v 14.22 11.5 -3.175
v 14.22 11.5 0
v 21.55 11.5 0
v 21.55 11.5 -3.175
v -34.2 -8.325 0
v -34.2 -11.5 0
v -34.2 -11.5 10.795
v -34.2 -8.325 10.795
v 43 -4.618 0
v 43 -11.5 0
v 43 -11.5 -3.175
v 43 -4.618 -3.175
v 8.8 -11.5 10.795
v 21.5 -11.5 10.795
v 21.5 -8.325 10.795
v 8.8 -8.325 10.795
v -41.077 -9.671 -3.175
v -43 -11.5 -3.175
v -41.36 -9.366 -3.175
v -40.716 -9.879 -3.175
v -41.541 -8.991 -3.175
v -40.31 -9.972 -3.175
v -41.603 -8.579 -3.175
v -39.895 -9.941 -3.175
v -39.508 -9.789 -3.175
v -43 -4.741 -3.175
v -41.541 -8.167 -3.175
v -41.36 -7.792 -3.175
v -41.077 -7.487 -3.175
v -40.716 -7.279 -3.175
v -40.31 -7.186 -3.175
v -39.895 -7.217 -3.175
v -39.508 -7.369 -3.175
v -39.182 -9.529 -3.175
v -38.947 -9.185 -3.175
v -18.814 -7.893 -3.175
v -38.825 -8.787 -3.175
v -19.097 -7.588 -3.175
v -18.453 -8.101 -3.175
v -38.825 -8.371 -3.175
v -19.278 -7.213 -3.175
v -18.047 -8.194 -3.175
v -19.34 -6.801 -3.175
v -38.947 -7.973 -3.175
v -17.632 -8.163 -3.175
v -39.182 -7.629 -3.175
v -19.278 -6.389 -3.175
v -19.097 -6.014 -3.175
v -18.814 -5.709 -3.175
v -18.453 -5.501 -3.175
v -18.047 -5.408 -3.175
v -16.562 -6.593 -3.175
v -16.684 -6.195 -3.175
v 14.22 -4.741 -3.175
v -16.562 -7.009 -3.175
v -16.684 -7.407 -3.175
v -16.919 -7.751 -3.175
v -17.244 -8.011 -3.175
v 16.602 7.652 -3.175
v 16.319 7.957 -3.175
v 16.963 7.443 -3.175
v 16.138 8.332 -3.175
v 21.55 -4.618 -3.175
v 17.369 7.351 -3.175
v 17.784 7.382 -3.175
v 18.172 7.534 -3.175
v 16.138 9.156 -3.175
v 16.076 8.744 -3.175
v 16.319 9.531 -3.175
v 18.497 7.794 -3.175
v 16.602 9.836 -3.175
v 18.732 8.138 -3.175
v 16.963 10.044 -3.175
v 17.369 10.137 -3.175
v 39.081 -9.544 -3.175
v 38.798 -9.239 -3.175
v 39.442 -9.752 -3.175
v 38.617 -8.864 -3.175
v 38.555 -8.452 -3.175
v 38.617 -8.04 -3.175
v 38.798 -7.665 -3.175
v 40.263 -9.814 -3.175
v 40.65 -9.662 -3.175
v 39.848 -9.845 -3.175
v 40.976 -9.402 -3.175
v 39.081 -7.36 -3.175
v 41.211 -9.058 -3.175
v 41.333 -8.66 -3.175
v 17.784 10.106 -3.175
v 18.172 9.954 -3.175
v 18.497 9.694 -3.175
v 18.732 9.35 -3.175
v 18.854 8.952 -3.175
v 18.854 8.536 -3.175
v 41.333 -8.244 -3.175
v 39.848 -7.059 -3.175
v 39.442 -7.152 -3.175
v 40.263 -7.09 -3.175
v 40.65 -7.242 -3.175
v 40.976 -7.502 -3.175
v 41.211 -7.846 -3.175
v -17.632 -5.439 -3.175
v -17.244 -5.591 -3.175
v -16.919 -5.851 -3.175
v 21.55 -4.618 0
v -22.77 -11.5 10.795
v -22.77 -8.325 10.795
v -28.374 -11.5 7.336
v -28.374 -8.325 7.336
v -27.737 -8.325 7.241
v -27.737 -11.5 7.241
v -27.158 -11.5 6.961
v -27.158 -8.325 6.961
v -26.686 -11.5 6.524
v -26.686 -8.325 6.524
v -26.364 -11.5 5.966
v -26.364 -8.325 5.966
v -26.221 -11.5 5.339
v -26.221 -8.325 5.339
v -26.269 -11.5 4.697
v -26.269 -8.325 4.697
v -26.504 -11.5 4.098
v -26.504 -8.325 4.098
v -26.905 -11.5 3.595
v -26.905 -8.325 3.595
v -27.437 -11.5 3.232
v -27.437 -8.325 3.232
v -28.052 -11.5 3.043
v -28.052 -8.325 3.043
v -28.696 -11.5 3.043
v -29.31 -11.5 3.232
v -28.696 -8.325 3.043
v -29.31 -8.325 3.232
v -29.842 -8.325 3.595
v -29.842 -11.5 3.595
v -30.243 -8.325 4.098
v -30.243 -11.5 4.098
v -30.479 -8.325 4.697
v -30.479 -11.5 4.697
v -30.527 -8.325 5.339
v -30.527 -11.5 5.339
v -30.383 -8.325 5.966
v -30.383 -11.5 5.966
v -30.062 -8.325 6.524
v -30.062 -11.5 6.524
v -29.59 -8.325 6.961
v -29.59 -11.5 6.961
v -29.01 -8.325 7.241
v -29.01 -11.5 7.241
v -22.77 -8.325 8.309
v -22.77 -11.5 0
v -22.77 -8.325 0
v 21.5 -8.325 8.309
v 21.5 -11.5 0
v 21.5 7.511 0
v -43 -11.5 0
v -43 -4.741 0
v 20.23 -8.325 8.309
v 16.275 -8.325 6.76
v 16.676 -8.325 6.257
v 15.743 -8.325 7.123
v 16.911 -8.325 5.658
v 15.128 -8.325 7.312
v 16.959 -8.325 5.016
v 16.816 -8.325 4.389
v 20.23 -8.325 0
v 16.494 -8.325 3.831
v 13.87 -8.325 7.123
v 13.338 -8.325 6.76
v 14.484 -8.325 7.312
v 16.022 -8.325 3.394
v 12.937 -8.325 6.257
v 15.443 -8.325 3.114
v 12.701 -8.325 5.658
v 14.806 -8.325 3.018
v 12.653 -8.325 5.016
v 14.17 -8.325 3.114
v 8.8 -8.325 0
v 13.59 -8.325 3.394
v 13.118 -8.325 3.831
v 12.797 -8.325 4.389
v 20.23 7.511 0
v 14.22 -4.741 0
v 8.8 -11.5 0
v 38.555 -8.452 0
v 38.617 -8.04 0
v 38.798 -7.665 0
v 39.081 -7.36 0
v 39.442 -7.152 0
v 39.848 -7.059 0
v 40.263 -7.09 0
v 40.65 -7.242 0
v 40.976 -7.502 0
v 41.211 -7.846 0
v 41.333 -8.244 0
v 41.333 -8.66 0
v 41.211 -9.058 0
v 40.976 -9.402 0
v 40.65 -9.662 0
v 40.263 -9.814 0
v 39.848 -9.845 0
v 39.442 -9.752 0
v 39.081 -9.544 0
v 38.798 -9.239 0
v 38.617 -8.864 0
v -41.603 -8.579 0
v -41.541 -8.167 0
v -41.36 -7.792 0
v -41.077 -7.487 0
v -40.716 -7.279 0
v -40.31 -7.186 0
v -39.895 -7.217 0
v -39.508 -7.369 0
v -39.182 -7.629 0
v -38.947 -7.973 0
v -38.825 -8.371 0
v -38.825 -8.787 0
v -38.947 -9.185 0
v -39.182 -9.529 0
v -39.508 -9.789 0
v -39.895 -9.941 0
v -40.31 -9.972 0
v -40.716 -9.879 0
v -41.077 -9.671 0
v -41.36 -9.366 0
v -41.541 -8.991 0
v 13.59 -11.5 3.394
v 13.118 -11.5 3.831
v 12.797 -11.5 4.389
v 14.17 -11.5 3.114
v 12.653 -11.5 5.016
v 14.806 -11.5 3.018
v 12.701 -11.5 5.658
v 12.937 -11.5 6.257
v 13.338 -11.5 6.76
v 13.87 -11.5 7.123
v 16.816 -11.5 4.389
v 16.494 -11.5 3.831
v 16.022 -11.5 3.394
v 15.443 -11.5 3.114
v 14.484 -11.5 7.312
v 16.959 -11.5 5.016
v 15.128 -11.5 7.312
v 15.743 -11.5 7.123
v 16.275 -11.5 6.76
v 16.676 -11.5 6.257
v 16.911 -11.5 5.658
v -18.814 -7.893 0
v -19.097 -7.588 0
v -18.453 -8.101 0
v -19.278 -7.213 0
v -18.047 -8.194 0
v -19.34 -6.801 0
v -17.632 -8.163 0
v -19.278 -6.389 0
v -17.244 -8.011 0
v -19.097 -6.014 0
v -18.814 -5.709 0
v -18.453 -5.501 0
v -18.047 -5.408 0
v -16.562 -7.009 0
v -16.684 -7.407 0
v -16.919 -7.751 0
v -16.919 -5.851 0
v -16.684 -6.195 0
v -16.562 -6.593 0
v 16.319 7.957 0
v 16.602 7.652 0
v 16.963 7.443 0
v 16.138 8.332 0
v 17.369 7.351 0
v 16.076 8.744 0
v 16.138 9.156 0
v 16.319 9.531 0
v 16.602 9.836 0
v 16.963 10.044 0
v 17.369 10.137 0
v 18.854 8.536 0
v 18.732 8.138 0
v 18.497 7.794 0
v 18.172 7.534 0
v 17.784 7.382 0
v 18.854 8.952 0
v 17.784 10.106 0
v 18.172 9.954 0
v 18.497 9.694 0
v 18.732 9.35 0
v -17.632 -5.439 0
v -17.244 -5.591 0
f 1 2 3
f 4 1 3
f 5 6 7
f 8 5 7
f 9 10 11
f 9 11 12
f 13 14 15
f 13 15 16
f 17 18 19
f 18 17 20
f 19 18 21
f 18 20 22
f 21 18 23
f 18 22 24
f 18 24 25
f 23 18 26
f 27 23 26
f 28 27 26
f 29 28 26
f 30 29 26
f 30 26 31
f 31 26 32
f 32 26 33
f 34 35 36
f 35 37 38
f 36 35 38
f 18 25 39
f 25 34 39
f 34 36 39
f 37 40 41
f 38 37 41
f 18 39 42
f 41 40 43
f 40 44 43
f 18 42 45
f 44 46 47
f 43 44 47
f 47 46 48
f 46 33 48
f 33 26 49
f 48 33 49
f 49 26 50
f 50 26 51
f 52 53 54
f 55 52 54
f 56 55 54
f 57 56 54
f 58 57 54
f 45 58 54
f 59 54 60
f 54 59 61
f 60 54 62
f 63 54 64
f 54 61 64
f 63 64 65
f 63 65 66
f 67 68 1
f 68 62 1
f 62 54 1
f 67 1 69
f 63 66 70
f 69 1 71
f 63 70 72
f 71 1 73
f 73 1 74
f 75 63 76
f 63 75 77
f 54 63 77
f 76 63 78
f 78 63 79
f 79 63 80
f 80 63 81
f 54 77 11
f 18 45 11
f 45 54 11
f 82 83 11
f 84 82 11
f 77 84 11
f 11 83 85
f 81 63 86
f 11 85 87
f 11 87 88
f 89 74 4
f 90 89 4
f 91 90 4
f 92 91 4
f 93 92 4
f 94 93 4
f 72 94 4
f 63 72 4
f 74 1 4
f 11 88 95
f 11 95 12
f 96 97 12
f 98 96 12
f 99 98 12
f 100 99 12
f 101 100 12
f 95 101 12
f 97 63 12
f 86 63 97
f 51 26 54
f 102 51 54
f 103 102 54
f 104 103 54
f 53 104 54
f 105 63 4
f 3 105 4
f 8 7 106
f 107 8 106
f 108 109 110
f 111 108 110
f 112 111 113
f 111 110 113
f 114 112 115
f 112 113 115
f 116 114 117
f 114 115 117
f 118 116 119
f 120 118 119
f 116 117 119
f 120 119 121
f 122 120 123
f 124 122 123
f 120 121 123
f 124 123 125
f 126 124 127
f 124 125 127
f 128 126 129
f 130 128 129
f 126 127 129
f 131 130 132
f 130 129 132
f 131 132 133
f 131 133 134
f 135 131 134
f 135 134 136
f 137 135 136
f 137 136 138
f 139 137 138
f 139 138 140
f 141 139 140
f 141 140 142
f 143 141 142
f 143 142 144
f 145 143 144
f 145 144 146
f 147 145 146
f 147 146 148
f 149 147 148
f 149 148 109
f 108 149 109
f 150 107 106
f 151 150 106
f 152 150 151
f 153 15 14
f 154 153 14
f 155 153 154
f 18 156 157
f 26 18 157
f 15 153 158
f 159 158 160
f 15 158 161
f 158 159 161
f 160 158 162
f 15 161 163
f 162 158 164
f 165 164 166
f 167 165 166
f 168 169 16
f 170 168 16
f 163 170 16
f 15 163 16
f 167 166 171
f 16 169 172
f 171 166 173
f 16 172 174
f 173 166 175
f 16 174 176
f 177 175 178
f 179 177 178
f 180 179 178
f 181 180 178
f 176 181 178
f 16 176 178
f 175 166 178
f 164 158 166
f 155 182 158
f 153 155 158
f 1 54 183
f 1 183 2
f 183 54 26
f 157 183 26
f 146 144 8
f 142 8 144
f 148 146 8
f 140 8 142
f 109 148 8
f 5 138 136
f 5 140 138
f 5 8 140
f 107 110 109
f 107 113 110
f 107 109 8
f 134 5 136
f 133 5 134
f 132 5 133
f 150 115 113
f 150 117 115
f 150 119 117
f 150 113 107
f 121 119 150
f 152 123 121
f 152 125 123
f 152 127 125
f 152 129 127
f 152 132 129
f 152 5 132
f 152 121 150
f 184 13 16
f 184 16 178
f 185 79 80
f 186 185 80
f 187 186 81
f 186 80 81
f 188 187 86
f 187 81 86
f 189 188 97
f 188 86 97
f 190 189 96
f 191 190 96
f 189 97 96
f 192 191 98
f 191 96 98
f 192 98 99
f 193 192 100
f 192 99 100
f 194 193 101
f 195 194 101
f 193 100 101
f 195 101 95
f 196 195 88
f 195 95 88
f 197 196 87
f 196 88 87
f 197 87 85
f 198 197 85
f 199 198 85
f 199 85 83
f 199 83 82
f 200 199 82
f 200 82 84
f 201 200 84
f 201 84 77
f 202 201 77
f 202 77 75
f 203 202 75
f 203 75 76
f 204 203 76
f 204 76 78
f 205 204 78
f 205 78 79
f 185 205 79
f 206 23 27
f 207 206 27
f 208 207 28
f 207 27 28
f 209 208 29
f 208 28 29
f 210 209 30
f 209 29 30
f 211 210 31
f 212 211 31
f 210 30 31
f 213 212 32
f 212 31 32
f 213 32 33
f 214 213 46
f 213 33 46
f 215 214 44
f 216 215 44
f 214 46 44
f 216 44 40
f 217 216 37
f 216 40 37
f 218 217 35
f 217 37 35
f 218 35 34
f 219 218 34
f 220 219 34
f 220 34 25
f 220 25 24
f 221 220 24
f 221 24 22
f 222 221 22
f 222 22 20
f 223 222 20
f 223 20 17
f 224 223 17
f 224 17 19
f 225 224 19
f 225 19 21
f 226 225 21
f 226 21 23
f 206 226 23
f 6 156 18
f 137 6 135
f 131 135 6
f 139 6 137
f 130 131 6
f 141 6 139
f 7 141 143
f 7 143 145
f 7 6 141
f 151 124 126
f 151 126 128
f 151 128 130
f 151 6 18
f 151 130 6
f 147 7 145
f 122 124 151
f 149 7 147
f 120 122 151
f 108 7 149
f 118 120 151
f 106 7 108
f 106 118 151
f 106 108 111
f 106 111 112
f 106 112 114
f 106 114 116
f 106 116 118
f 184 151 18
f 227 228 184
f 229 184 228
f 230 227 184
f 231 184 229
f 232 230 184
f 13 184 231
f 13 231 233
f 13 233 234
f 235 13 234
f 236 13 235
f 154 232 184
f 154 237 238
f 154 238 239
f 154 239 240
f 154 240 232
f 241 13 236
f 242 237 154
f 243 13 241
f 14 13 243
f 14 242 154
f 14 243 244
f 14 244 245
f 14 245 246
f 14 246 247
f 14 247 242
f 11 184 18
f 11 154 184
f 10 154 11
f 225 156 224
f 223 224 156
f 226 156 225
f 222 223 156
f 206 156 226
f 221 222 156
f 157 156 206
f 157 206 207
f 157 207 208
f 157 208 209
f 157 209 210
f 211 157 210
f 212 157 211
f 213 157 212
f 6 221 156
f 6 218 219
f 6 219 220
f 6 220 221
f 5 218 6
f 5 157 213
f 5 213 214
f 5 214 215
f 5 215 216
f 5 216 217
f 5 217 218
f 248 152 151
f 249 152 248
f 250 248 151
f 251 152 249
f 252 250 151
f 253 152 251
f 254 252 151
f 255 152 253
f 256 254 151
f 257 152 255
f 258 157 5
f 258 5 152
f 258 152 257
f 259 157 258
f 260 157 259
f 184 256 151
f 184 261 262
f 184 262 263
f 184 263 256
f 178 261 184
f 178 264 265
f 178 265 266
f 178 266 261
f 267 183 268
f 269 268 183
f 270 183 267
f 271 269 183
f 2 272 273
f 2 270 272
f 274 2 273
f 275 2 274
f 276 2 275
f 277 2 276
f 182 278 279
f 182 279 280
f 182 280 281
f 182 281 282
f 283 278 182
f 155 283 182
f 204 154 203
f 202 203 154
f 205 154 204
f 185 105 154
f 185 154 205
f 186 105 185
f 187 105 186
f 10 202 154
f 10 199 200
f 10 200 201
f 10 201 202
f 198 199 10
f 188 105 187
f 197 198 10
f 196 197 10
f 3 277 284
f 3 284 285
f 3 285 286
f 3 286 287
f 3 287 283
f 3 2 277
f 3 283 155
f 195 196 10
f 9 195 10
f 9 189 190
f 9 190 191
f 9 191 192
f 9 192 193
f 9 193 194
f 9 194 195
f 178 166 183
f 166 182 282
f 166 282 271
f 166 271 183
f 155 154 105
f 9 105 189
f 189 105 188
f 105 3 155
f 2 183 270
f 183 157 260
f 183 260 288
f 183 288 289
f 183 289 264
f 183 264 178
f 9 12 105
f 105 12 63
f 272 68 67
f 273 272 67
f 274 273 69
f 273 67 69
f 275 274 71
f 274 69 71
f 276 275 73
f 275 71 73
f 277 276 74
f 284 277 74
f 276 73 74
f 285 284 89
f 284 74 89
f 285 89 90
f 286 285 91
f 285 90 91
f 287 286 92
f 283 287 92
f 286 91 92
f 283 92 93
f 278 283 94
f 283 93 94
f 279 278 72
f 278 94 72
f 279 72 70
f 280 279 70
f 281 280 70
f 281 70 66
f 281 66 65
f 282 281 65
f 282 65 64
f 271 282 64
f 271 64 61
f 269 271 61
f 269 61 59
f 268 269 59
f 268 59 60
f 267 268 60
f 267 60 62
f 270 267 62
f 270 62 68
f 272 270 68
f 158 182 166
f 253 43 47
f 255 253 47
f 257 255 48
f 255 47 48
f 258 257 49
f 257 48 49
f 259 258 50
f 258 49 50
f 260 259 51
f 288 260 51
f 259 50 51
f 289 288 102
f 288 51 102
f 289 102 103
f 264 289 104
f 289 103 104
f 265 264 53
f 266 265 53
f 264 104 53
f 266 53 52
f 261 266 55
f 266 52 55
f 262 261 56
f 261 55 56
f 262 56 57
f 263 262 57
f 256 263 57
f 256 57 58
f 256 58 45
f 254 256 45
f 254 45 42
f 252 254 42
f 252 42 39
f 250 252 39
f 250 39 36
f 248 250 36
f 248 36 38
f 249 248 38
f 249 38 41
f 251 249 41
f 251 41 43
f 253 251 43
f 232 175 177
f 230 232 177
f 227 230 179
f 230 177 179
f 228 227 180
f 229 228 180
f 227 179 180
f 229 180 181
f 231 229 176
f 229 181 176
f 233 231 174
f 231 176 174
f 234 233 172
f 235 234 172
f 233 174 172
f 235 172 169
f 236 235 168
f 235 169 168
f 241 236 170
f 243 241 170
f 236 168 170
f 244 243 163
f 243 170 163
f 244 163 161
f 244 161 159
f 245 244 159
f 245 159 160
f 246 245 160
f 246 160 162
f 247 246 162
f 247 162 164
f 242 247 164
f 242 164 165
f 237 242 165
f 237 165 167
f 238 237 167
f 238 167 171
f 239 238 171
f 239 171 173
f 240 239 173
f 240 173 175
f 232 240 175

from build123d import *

# Parameters (mm, degrees)
SKETCH1_W           = 86
SKETCH1_H           = 23
BOSS_EXTRUDE1_DEPTH = 3.175
BOSS_EXTRUDE2_DEPTH = 3.175
RIB4_REACH          = 68.401
SKETCH11_WALL_W     = 152.68434621
SKETCH11_WALL_H     = 2.54
SKETCH17_W          = 12.7
SKETCH17_H          = 10.795
CUT_EXTRUDE1_DEPTH  = 50.945290319
SKETCH18_R          = 2.159
CUT_EXTRUDE2_DEPTH  = 127
SKETCH19_R          = 1.397
CUT_EXTRUDE3_DEPTH  = 47.652019249
SKETCH21_W          = 1.27
SKETCH21_H          = 10.795
CUT_EXTRUDE4_DEPTH  = 50.945290319
SKETCH23_W          = 57.219873646
SKETCH23_H          = 16.240764414
SKETCH23_W_2        = 21.450294578
SKETCH23_H_2        = 16.117794019
CUT_EXTRUDE5_DEPTH  = 47.652019249


with BuildPart() as part:
    # Sketch1 → Boss-Extrude1 (new body)
    with BuildSketch(Plane.XY):
        Rectangle(SKETCH1_W, SKETCH1_H)
    extrude(amount=-BOSS_EXTRUDE1_DEPTH)

    # Sketch3 → Boss-Extrude2 (add)
    with BuildSketch(Plane(origin=(0, -11.5, 0), x_dir=(-1, 0, 0), z_dir=(0, -1, 0))):
        Polygon((34.200000011, 0), (34.200000011, -10.795), (8.80000001, -10.795), (8.800000011, 0), align=None)
        Polygon((-34.200000011, 0), (-34.200000011, -10.795), (-8.80000001, -10.795), (-8.800000011, 0), align=None)
    extrude(amount=-BOSS_EXTRUDE2_DEPTH)

    # Sketch11 wall → Rib4 (add, up to next)
    with BuildSketch(Plane(origin=(-21.500000011, -0.407189587, 4.154640606), x_dir=(-5.6e-11, -0.885499596527, 0.46464014522), z_dir=(0, 0.46464014522, 0.885499596527)), mode=Mode.PRIVATE) as rib4_sk1:
        Rectangle(SKETCH11_WALL_W, SKETCH11_WALL_H)
    rib4_tool1 = extrude(rib4_sk1.sketch, amount=-RIB4_REACH, mode=Mode.PRIVATE) - part.part
    rib4 = rib4_tool1.solids().sort_by_distance((-21.500000011, -0.407189587, 4.154640606))[0]
    add(rib4)

    # Mirror1: Rib4 across plane
    add(rib4.mirror(Plane(origin=(0, 0, 0), x_dir=(0, 0, 1), z_dir=(1, 0, 0))))

    # Sketch17 → Cut-Extrude1 (cut, through all)
    with BuildSketch(Plane(origin=(0, 11.5, 0), x_dir=(1, 0, 0), z_dir=(0, 1, 0))):
        with Locations((-15.15000001, -5.3975)):
            Rectangle(SKETCH17_W, SKETCH17_H)
        with Locations((27.850000011, -5.3975)):
            Rectangle(SKETCH17_W, SKETCH17_H)
    extrude(amount=-CUT_EXTRUDE1_DEPTH, mode=Mode.SUBTRACT)

    # Sketch18 → Cut-Extrude2 (cut)
    with BuildSketch(Plane(origin=(0, 11.5, 0), x_dir=(1, 0, 0), z_dir=(0, 1, 0))):
        with Locations(Location((-28.373739812, -5.177433052, 0), (0, 0, 270))):
            Circle(SKETCH18_R)
        with Locations(Location((14.806260188, -5.177433052, 0), (0, 0, 90))):
            Circle(SKETCH18_R)
    extrude(amount=-CUT_EXTRUDE2_DEPTH, mode=Mode.SUBTRACT)

    # Sketch19 → Cut-Extrude3 (cut, through all)
    with BuildSketch(Plane(origin=(0, 0, -3.175), x_dir=(-1, 0, 0), z_dir=(0, 0, -1))):
        with Locations((-39.952, -8.452)):
            Circle(SKETCH19_R)
        with Locations((-17.473, 8.7438)):
            Circle(SKETCH19_R)
        with Locations((17.9429, -6.801)):
            Circle(SKETCH19_R)
        with Locations((40.206, -8.579)):
            Circle(SKETCH19_R)
    extrude(amount=-CUT_EXTRUDE3_DEPTH, mode=Mode.SUBTRACT)

    # Sketch21 → Cut-Extrude4 (cut, through all)
    with BuildSketch(Plane(origin=(0, 11.5, 0), x_dir=(1, 0, 0), z_dir=(0, 1, 0))):
        with Locations((-22.13500001, -5.3975)):
            Rectangle(SKETCH21_W, SKETCH21_H)
    extrude(amount=-CUT_EXTRUDE4_DEPTH, mode=Mode.SUBTRACT)

    # Sketch23 → Cut-Extrude5 (cut, through all)
    with BuildSketch(Plane(origin=(0, 0, -3.175), x_dir=(-1, 0, 0), z_dir=(0, 0, -1))):
        with Locations((14.390063177, 3.379617793)):
            Rectangle(SKETCH23_W, SKETCH23_H)
        with Locations((-32.274852711, 3.44110299)):
            Rectangle(SKETCH23_W_2, SKETCH23_H_2)
    extrude(amount=-CUT_EXTRUDE5_DEPTH, mode=Mode.SUBTRACT)


solid = part.part
